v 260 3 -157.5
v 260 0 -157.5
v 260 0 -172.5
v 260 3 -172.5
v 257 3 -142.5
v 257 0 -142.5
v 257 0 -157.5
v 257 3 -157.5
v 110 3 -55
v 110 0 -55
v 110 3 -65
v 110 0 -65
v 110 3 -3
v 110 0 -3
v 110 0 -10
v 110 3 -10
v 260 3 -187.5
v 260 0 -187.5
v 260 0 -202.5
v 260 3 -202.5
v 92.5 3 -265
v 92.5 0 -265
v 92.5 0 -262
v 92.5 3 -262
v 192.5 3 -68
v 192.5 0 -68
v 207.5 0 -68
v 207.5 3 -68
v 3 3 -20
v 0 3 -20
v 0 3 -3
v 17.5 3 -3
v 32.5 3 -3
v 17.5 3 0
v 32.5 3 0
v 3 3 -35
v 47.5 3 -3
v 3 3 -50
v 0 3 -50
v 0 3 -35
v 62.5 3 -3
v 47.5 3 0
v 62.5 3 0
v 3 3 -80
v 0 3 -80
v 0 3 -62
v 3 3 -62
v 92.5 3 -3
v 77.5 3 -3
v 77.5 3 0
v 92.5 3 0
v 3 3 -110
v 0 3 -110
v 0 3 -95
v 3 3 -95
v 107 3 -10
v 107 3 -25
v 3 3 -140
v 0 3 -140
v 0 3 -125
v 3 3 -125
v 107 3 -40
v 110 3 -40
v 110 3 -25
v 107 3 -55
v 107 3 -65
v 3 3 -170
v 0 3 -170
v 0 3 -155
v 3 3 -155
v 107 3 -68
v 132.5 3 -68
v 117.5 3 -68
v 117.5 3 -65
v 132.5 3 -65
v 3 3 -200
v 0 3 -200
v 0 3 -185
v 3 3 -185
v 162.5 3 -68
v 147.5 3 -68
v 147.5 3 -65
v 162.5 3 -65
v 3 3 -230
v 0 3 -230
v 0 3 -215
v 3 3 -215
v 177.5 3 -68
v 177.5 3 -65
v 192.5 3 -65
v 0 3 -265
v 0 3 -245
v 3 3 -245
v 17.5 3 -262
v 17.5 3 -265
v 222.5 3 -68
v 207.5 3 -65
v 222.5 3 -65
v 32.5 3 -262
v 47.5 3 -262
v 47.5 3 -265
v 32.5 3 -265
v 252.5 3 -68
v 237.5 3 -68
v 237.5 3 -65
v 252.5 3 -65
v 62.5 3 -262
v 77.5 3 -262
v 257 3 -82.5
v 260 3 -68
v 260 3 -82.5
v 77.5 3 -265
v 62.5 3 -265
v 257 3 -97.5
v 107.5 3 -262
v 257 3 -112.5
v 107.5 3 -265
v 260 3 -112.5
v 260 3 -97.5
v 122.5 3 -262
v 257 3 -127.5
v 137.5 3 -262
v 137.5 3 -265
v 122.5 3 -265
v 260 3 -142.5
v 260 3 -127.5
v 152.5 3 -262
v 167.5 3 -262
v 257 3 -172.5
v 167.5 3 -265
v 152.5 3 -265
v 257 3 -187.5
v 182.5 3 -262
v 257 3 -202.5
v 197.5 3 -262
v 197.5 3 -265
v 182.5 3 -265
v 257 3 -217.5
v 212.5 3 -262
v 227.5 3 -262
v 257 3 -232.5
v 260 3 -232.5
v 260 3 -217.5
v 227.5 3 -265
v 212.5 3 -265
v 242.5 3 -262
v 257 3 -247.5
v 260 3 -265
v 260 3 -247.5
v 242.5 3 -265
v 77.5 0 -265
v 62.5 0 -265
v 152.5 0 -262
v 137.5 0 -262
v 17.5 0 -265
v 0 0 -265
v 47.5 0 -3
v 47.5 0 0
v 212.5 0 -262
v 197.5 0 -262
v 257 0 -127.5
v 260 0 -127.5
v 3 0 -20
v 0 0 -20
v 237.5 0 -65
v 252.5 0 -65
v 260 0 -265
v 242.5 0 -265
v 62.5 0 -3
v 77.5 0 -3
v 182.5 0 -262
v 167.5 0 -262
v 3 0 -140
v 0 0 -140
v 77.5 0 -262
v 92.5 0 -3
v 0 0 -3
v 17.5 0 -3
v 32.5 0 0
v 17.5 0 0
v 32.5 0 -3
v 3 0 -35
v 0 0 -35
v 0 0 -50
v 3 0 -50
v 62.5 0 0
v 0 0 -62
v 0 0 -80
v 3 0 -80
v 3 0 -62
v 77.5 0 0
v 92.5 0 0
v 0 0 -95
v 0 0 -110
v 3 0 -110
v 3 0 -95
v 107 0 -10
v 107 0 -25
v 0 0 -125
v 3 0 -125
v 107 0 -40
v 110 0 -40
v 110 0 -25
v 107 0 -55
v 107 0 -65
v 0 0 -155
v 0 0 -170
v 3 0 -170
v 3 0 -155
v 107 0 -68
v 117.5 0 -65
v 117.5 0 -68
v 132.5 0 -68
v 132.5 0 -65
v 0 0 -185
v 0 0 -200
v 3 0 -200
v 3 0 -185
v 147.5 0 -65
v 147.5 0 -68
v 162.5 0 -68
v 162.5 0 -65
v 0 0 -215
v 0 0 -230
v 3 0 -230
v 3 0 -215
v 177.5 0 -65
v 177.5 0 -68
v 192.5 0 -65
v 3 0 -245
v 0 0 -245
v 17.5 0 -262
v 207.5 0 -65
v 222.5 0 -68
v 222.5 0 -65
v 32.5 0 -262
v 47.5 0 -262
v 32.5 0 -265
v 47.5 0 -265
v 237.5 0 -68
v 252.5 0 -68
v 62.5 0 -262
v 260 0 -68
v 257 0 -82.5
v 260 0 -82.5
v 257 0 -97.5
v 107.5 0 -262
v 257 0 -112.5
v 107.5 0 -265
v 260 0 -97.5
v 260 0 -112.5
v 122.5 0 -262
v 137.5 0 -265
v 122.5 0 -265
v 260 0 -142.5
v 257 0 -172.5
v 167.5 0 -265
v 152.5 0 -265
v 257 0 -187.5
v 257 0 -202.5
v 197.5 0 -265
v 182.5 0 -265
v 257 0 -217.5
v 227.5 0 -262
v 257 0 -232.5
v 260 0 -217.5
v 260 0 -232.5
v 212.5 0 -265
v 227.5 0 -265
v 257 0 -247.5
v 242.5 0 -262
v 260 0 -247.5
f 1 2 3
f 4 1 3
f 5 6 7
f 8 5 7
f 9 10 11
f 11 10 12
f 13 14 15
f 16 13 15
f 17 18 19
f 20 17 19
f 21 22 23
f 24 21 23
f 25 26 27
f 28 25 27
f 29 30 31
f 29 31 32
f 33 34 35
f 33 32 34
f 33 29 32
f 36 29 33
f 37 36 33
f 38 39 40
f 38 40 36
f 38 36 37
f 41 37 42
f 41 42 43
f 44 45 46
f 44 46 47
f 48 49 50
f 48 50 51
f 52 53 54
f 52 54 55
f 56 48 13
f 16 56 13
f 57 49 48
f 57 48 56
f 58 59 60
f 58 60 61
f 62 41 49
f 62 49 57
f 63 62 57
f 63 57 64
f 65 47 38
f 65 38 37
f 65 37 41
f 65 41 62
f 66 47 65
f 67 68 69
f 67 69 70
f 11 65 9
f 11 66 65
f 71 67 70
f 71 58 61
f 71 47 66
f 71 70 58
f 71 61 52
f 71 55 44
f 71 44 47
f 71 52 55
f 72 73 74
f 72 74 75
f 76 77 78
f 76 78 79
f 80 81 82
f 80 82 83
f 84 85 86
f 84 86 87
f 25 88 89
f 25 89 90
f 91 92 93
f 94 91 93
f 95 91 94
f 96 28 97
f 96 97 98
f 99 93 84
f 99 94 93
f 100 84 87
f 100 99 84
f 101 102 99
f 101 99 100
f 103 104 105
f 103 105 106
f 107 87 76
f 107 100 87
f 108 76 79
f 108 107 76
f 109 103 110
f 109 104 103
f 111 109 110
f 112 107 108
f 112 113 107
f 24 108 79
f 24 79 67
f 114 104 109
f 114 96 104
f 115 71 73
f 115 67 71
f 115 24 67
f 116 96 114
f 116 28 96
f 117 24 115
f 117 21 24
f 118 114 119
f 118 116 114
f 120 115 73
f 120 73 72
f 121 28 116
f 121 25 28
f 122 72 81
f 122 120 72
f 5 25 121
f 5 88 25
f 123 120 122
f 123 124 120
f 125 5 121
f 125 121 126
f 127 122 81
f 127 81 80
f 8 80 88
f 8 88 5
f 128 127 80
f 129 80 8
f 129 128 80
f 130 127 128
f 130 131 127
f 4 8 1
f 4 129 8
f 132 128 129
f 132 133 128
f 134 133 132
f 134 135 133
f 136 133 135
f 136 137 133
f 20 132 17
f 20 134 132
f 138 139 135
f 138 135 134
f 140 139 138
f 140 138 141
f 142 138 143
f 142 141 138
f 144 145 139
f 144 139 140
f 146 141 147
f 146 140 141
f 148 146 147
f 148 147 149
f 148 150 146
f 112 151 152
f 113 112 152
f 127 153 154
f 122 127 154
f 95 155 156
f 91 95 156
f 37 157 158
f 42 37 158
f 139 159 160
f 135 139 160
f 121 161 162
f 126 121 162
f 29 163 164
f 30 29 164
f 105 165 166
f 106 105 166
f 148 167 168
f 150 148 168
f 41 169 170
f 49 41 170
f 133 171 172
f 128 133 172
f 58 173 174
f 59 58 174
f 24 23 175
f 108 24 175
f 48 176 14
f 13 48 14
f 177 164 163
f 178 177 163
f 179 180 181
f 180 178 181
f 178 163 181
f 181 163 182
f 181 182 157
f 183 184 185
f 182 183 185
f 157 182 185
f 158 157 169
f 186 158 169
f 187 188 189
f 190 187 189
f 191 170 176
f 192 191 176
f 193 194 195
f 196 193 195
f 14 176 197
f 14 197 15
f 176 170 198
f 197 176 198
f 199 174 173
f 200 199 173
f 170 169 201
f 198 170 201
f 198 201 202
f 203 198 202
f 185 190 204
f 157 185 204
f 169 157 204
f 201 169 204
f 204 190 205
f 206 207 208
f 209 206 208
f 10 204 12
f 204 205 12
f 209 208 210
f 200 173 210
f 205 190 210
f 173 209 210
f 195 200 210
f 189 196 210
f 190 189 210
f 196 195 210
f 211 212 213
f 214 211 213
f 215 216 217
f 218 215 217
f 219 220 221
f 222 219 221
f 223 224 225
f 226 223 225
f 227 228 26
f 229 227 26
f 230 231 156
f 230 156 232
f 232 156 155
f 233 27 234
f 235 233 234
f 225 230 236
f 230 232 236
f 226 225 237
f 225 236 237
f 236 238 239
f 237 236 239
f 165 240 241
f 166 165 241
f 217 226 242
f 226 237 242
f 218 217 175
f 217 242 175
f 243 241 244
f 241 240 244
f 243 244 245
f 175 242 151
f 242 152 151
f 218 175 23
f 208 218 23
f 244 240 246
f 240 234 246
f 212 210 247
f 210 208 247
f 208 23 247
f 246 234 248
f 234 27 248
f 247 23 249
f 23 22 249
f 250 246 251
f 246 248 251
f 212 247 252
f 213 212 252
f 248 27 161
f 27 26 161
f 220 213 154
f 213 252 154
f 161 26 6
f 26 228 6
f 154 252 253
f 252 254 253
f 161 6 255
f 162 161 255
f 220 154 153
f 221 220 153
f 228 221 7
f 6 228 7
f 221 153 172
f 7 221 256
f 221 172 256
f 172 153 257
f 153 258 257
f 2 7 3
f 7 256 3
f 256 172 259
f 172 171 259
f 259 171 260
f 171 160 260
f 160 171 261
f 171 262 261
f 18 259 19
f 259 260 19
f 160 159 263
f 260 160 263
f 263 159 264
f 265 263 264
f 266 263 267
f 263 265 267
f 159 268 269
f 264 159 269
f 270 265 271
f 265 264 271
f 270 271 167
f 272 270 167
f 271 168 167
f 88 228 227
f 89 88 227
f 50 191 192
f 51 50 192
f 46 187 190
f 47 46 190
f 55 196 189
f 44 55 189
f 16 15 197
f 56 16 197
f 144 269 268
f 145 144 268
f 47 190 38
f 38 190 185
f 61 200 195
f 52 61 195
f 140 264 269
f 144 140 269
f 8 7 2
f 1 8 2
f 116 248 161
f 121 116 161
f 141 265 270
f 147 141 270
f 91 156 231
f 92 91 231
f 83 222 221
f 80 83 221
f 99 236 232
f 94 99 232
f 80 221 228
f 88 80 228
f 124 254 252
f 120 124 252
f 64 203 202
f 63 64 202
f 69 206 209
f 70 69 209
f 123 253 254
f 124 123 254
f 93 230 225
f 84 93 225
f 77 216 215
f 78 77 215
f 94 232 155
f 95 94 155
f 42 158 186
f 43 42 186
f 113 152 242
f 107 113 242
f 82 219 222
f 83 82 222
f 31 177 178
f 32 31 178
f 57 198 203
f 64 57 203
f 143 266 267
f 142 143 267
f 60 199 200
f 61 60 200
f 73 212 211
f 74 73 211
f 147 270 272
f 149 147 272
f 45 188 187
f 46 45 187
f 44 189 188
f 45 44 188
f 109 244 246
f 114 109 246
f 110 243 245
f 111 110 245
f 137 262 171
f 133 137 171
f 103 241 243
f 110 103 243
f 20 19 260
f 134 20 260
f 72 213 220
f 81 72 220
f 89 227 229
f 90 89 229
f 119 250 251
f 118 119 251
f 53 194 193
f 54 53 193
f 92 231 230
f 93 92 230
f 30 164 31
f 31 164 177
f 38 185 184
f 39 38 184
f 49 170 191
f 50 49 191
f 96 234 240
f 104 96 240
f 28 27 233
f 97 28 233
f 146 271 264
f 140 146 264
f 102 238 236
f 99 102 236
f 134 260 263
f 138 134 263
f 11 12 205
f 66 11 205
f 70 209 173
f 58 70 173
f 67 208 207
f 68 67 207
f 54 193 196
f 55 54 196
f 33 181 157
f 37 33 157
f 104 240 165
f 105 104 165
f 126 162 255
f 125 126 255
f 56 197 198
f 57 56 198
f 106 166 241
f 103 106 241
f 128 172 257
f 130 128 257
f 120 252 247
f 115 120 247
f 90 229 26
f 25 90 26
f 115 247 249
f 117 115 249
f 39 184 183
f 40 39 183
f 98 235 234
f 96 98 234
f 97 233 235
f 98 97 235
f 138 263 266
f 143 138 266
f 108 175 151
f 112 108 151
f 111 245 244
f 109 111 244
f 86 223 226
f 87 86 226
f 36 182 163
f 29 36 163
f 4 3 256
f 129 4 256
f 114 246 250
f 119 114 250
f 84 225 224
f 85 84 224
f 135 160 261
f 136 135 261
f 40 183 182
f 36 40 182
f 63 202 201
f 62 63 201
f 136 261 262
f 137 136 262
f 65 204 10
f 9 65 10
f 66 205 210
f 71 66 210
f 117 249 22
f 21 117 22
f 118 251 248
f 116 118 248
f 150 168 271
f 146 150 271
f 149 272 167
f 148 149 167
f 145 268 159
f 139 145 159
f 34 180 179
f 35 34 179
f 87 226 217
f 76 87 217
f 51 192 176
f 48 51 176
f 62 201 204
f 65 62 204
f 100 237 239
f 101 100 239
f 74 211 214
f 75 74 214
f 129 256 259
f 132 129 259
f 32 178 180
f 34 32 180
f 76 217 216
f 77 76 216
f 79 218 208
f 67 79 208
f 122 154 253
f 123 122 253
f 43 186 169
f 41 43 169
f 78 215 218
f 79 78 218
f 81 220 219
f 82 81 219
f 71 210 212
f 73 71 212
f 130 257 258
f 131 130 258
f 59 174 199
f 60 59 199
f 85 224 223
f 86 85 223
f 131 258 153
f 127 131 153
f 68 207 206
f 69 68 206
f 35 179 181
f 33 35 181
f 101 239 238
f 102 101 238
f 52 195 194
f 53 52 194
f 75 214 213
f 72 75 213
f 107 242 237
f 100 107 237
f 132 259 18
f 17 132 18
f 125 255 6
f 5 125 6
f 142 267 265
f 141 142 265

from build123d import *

# Parameters (mm, degrees)
SALIENTE_EXTRUIR1_DEPTH = 3


with BuildPart() as part:
    # Croquis1 → Saliente-Extruir1 (new body)
    with BuildSketch(Plane(origin=(0, 0, 0), x_dir=(1, 0, 0), z_dir=(0, 1, 0))):
        Polygon((17.5, 0), (32.5, 0), (32.5, 3), (47.5, 3), (47.5, 0), (62.5, 0), (62.5, 3), (77.5, 3), (77.5, 0), (92.5, 0), (92.5, 3), (110, 3), (110, 10), (107, 10), (107, 25), (110, 25), (110, 40), (107, 40), (107, 55), (110, 55), (110, 65), (107, 65), (107, 68), (117.5, 68), (117.5, 65), (132.5, 65), (132.5, 68), (147.5, 68), (147.5, 65), (162.5, 65), (162.5, 68), (177.5, 68), (177.5, 65), (192.5, 65), (192.5, 68), (207.5, 68), (207.5, 65), (222.5, 65), (222.5, 68), (237.5, 68), (237.5, 65), (252.5, 65), (252.5, 68), (260, 68), (260, 82.5), (257, 82.5), (257, 97.5), (260, 97.5), (260, 112.5), (257, 112.5), (257, 127.5), (260, 127.5), (260, 142.5), (257, 142.5), (257, 157.5), (260, 157.5), (260, 172.5), (257, 172.5), (257, 187.5), (260, 187.5), (260, 202.5), (257, 202.5), (257, 217.5), (260, 217.5), (260, 232.5), (257, 232.5), (257, 247.5), (260, 247.5), (260, 265), (242.5, 265), (242.5, 262), (227.5, 262), (227.5, 265), (212.5, 265), (212.5, 262), (197.5, 262), (197.5, 265), (182.5, 265), (182.5, 262), (167.5, 262), (167.5, 265), (152.5, 265), (152.5, 262), (137.5, 262), (137.5, 265), (122.5, 265), (122.5, 262), (107.5, 262), (107.5, 265), (92.5, 265), (92.5, 262), (77.5, 262), (77.5, 265), (62.5, 265), (62.5, 262), (47.5, 262), (47.5, 265), (32.5, 265), (32.5, 262), (17.5, 262), (17.5, 265), (0, 265), (0, 245), (3, 245), (3, 230), (0, 230), (0, 215), (3, 215), (3, 200), (0, 200), (0, 185), (3, 185), (3, 170), (0, 170), (0, 155), (3, 155), (3, 140), (0, 140), (0, 125), (3, 125), (3, 110), (0, 110), (0, 95), (3, 95), (3, 80), (0, 80), (0, 62), (3, 62), (3, 50), (0, 50), (0, 35), (3, 35), (3, 20), (0, 20), (0, 3), (17.5, 3), align=None)
    extrude(amount=SALIENTE_EXTRUIR1_DEPTH)


solid = part.part
